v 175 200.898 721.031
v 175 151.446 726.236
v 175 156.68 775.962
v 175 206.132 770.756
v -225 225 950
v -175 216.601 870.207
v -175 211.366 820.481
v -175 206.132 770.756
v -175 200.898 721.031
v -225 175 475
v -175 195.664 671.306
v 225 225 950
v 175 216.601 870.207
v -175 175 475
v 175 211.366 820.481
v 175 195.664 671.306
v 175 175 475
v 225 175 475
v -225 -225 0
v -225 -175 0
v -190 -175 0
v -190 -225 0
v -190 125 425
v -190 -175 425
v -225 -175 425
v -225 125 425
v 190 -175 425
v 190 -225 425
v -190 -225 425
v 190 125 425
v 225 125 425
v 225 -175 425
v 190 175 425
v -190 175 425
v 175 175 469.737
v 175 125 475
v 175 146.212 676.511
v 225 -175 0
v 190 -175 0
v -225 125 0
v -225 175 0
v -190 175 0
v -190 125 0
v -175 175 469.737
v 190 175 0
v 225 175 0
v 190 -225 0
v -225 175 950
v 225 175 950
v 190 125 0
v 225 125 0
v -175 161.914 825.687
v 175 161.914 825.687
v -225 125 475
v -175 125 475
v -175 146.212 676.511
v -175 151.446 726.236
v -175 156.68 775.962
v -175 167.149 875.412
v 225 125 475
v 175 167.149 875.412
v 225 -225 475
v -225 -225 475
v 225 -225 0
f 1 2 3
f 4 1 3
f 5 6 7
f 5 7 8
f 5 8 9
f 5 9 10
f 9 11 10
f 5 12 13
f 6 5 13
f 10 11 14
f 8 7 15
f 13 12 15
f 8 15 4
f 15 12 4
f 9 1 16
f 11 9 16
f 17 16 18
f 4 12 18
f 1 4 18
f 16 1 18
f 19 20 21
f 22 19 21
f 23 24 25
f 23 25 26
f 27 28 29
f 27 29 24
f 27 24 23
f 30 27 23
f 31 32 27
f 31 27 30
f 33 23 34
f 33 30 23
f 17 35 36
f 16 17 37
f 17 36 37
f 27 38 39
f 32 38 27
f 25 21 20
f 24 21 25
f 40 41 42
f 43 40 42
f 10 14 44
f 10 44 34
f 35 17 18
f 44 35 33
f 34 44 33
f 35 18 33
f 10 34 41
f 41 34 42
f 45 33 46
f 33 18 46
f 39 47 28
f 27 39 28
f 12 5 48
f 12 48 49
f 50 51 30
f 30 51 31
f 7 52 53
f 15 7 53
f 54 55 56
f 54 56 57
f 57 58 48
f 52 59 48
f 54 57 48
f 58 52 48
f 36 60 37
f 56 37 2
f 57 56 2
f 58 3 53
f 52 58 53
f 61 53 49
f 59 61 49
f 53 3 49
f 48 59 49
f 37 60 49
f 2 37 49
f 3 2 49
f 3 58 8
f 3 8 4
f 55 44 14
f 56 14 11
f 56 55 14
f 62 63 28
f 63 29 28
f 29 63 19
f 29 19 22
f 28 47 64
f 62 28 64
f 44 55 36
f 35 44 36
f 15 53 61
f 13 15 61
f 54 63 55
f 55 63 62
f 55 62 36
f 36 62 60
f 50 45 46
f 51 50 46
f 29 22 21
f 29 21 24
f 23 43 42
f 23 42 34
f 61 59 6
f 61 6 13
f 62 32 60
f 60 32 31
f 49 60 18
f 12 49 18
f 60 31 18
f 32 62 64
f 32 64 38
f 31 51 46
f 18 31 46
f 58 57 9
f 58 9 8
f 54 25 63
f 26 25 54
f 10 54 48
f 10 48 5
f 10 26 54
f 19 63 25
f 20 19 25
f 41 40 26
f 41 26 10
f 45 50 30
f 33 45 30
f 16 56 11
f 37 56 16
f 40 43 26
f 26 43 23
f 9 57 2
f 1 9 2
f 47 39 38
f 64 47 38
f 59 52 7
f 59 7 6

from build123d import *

# Parameters (mm, degrees)
F0_W     = 450
F0_H     = 450
F1_DEPTH = 950
F2_W     = 50
F2_H     = 50
F2_H_2   = 425
F2_W_2   = 300
F3_DEPTH = 450.001
F4_W     = 380
F4_H     = 425
F5_DEPTH = 450.001
F6_W     = 350
F6_H     = 202.6243293636
F6_H_2   = 50
F7_DEPTH = 149.1768179382


with BuildPart() as f1:
    # F0 (on Top) → F1 (new body)
    with BuildSketch(Plane.XY):
        Rectangle(F0_W, F0_H)
    extrude(amount=F1_DEPTH)

    # F2 (on face) → F3 (cut, through all)
    with BuildSketch(Plane.YZ.offset(225)):
        Polygon((-225, 475), (125, 475), (175, 950), (-225, 950), align=None)
        Polygon((175, 475), (225, 475), (225, 950), align=None)
        with Locations((200, 450)):
            Rectangle(F2_W, F2_H)
        with Locations((200, 212.5)):
            Rectangle(F2_W, F2_H_2)
        with Locations((-25, 212.5)):
            Rectangle(F2_W_2, F2_H_2)
    extrude(amount=-F3_DEPTH, mode=Mode.SUBTRACT)

    # F4 (on face) → F5 (cut, through all)
    with BuildSketch(Plane.XZ.offset(225)):
        with Locations((0, 212.5)):
            Rectangle(F4_W, F4_H)
    extrude(amount=-F5_DEPTH, mode=Mode.SUBTRACT)

    # F6 (on face) → F7 (cut, through all)
    with BuildSketch(Plane(origin=(0, 74.1780821918, -7.8082191781), x_dir=(1, 0, 0), z_dir=(0, -0.9945054529, 0.1046847845))):
        with Locations((0, 586.7878528842)):
            Rectangle(F6_W, F6_H)
        with Locations((0, 763.100017566)):
            Rectangle(F6_W, F6_H_2)
        with Locations((0, 863.100017566)):
            Rectangle(F6_W, F6_H_2)
    extrude(amount=-F7_DEPTH, mode=Mode.SUBTRACT)


solid = f1.part
